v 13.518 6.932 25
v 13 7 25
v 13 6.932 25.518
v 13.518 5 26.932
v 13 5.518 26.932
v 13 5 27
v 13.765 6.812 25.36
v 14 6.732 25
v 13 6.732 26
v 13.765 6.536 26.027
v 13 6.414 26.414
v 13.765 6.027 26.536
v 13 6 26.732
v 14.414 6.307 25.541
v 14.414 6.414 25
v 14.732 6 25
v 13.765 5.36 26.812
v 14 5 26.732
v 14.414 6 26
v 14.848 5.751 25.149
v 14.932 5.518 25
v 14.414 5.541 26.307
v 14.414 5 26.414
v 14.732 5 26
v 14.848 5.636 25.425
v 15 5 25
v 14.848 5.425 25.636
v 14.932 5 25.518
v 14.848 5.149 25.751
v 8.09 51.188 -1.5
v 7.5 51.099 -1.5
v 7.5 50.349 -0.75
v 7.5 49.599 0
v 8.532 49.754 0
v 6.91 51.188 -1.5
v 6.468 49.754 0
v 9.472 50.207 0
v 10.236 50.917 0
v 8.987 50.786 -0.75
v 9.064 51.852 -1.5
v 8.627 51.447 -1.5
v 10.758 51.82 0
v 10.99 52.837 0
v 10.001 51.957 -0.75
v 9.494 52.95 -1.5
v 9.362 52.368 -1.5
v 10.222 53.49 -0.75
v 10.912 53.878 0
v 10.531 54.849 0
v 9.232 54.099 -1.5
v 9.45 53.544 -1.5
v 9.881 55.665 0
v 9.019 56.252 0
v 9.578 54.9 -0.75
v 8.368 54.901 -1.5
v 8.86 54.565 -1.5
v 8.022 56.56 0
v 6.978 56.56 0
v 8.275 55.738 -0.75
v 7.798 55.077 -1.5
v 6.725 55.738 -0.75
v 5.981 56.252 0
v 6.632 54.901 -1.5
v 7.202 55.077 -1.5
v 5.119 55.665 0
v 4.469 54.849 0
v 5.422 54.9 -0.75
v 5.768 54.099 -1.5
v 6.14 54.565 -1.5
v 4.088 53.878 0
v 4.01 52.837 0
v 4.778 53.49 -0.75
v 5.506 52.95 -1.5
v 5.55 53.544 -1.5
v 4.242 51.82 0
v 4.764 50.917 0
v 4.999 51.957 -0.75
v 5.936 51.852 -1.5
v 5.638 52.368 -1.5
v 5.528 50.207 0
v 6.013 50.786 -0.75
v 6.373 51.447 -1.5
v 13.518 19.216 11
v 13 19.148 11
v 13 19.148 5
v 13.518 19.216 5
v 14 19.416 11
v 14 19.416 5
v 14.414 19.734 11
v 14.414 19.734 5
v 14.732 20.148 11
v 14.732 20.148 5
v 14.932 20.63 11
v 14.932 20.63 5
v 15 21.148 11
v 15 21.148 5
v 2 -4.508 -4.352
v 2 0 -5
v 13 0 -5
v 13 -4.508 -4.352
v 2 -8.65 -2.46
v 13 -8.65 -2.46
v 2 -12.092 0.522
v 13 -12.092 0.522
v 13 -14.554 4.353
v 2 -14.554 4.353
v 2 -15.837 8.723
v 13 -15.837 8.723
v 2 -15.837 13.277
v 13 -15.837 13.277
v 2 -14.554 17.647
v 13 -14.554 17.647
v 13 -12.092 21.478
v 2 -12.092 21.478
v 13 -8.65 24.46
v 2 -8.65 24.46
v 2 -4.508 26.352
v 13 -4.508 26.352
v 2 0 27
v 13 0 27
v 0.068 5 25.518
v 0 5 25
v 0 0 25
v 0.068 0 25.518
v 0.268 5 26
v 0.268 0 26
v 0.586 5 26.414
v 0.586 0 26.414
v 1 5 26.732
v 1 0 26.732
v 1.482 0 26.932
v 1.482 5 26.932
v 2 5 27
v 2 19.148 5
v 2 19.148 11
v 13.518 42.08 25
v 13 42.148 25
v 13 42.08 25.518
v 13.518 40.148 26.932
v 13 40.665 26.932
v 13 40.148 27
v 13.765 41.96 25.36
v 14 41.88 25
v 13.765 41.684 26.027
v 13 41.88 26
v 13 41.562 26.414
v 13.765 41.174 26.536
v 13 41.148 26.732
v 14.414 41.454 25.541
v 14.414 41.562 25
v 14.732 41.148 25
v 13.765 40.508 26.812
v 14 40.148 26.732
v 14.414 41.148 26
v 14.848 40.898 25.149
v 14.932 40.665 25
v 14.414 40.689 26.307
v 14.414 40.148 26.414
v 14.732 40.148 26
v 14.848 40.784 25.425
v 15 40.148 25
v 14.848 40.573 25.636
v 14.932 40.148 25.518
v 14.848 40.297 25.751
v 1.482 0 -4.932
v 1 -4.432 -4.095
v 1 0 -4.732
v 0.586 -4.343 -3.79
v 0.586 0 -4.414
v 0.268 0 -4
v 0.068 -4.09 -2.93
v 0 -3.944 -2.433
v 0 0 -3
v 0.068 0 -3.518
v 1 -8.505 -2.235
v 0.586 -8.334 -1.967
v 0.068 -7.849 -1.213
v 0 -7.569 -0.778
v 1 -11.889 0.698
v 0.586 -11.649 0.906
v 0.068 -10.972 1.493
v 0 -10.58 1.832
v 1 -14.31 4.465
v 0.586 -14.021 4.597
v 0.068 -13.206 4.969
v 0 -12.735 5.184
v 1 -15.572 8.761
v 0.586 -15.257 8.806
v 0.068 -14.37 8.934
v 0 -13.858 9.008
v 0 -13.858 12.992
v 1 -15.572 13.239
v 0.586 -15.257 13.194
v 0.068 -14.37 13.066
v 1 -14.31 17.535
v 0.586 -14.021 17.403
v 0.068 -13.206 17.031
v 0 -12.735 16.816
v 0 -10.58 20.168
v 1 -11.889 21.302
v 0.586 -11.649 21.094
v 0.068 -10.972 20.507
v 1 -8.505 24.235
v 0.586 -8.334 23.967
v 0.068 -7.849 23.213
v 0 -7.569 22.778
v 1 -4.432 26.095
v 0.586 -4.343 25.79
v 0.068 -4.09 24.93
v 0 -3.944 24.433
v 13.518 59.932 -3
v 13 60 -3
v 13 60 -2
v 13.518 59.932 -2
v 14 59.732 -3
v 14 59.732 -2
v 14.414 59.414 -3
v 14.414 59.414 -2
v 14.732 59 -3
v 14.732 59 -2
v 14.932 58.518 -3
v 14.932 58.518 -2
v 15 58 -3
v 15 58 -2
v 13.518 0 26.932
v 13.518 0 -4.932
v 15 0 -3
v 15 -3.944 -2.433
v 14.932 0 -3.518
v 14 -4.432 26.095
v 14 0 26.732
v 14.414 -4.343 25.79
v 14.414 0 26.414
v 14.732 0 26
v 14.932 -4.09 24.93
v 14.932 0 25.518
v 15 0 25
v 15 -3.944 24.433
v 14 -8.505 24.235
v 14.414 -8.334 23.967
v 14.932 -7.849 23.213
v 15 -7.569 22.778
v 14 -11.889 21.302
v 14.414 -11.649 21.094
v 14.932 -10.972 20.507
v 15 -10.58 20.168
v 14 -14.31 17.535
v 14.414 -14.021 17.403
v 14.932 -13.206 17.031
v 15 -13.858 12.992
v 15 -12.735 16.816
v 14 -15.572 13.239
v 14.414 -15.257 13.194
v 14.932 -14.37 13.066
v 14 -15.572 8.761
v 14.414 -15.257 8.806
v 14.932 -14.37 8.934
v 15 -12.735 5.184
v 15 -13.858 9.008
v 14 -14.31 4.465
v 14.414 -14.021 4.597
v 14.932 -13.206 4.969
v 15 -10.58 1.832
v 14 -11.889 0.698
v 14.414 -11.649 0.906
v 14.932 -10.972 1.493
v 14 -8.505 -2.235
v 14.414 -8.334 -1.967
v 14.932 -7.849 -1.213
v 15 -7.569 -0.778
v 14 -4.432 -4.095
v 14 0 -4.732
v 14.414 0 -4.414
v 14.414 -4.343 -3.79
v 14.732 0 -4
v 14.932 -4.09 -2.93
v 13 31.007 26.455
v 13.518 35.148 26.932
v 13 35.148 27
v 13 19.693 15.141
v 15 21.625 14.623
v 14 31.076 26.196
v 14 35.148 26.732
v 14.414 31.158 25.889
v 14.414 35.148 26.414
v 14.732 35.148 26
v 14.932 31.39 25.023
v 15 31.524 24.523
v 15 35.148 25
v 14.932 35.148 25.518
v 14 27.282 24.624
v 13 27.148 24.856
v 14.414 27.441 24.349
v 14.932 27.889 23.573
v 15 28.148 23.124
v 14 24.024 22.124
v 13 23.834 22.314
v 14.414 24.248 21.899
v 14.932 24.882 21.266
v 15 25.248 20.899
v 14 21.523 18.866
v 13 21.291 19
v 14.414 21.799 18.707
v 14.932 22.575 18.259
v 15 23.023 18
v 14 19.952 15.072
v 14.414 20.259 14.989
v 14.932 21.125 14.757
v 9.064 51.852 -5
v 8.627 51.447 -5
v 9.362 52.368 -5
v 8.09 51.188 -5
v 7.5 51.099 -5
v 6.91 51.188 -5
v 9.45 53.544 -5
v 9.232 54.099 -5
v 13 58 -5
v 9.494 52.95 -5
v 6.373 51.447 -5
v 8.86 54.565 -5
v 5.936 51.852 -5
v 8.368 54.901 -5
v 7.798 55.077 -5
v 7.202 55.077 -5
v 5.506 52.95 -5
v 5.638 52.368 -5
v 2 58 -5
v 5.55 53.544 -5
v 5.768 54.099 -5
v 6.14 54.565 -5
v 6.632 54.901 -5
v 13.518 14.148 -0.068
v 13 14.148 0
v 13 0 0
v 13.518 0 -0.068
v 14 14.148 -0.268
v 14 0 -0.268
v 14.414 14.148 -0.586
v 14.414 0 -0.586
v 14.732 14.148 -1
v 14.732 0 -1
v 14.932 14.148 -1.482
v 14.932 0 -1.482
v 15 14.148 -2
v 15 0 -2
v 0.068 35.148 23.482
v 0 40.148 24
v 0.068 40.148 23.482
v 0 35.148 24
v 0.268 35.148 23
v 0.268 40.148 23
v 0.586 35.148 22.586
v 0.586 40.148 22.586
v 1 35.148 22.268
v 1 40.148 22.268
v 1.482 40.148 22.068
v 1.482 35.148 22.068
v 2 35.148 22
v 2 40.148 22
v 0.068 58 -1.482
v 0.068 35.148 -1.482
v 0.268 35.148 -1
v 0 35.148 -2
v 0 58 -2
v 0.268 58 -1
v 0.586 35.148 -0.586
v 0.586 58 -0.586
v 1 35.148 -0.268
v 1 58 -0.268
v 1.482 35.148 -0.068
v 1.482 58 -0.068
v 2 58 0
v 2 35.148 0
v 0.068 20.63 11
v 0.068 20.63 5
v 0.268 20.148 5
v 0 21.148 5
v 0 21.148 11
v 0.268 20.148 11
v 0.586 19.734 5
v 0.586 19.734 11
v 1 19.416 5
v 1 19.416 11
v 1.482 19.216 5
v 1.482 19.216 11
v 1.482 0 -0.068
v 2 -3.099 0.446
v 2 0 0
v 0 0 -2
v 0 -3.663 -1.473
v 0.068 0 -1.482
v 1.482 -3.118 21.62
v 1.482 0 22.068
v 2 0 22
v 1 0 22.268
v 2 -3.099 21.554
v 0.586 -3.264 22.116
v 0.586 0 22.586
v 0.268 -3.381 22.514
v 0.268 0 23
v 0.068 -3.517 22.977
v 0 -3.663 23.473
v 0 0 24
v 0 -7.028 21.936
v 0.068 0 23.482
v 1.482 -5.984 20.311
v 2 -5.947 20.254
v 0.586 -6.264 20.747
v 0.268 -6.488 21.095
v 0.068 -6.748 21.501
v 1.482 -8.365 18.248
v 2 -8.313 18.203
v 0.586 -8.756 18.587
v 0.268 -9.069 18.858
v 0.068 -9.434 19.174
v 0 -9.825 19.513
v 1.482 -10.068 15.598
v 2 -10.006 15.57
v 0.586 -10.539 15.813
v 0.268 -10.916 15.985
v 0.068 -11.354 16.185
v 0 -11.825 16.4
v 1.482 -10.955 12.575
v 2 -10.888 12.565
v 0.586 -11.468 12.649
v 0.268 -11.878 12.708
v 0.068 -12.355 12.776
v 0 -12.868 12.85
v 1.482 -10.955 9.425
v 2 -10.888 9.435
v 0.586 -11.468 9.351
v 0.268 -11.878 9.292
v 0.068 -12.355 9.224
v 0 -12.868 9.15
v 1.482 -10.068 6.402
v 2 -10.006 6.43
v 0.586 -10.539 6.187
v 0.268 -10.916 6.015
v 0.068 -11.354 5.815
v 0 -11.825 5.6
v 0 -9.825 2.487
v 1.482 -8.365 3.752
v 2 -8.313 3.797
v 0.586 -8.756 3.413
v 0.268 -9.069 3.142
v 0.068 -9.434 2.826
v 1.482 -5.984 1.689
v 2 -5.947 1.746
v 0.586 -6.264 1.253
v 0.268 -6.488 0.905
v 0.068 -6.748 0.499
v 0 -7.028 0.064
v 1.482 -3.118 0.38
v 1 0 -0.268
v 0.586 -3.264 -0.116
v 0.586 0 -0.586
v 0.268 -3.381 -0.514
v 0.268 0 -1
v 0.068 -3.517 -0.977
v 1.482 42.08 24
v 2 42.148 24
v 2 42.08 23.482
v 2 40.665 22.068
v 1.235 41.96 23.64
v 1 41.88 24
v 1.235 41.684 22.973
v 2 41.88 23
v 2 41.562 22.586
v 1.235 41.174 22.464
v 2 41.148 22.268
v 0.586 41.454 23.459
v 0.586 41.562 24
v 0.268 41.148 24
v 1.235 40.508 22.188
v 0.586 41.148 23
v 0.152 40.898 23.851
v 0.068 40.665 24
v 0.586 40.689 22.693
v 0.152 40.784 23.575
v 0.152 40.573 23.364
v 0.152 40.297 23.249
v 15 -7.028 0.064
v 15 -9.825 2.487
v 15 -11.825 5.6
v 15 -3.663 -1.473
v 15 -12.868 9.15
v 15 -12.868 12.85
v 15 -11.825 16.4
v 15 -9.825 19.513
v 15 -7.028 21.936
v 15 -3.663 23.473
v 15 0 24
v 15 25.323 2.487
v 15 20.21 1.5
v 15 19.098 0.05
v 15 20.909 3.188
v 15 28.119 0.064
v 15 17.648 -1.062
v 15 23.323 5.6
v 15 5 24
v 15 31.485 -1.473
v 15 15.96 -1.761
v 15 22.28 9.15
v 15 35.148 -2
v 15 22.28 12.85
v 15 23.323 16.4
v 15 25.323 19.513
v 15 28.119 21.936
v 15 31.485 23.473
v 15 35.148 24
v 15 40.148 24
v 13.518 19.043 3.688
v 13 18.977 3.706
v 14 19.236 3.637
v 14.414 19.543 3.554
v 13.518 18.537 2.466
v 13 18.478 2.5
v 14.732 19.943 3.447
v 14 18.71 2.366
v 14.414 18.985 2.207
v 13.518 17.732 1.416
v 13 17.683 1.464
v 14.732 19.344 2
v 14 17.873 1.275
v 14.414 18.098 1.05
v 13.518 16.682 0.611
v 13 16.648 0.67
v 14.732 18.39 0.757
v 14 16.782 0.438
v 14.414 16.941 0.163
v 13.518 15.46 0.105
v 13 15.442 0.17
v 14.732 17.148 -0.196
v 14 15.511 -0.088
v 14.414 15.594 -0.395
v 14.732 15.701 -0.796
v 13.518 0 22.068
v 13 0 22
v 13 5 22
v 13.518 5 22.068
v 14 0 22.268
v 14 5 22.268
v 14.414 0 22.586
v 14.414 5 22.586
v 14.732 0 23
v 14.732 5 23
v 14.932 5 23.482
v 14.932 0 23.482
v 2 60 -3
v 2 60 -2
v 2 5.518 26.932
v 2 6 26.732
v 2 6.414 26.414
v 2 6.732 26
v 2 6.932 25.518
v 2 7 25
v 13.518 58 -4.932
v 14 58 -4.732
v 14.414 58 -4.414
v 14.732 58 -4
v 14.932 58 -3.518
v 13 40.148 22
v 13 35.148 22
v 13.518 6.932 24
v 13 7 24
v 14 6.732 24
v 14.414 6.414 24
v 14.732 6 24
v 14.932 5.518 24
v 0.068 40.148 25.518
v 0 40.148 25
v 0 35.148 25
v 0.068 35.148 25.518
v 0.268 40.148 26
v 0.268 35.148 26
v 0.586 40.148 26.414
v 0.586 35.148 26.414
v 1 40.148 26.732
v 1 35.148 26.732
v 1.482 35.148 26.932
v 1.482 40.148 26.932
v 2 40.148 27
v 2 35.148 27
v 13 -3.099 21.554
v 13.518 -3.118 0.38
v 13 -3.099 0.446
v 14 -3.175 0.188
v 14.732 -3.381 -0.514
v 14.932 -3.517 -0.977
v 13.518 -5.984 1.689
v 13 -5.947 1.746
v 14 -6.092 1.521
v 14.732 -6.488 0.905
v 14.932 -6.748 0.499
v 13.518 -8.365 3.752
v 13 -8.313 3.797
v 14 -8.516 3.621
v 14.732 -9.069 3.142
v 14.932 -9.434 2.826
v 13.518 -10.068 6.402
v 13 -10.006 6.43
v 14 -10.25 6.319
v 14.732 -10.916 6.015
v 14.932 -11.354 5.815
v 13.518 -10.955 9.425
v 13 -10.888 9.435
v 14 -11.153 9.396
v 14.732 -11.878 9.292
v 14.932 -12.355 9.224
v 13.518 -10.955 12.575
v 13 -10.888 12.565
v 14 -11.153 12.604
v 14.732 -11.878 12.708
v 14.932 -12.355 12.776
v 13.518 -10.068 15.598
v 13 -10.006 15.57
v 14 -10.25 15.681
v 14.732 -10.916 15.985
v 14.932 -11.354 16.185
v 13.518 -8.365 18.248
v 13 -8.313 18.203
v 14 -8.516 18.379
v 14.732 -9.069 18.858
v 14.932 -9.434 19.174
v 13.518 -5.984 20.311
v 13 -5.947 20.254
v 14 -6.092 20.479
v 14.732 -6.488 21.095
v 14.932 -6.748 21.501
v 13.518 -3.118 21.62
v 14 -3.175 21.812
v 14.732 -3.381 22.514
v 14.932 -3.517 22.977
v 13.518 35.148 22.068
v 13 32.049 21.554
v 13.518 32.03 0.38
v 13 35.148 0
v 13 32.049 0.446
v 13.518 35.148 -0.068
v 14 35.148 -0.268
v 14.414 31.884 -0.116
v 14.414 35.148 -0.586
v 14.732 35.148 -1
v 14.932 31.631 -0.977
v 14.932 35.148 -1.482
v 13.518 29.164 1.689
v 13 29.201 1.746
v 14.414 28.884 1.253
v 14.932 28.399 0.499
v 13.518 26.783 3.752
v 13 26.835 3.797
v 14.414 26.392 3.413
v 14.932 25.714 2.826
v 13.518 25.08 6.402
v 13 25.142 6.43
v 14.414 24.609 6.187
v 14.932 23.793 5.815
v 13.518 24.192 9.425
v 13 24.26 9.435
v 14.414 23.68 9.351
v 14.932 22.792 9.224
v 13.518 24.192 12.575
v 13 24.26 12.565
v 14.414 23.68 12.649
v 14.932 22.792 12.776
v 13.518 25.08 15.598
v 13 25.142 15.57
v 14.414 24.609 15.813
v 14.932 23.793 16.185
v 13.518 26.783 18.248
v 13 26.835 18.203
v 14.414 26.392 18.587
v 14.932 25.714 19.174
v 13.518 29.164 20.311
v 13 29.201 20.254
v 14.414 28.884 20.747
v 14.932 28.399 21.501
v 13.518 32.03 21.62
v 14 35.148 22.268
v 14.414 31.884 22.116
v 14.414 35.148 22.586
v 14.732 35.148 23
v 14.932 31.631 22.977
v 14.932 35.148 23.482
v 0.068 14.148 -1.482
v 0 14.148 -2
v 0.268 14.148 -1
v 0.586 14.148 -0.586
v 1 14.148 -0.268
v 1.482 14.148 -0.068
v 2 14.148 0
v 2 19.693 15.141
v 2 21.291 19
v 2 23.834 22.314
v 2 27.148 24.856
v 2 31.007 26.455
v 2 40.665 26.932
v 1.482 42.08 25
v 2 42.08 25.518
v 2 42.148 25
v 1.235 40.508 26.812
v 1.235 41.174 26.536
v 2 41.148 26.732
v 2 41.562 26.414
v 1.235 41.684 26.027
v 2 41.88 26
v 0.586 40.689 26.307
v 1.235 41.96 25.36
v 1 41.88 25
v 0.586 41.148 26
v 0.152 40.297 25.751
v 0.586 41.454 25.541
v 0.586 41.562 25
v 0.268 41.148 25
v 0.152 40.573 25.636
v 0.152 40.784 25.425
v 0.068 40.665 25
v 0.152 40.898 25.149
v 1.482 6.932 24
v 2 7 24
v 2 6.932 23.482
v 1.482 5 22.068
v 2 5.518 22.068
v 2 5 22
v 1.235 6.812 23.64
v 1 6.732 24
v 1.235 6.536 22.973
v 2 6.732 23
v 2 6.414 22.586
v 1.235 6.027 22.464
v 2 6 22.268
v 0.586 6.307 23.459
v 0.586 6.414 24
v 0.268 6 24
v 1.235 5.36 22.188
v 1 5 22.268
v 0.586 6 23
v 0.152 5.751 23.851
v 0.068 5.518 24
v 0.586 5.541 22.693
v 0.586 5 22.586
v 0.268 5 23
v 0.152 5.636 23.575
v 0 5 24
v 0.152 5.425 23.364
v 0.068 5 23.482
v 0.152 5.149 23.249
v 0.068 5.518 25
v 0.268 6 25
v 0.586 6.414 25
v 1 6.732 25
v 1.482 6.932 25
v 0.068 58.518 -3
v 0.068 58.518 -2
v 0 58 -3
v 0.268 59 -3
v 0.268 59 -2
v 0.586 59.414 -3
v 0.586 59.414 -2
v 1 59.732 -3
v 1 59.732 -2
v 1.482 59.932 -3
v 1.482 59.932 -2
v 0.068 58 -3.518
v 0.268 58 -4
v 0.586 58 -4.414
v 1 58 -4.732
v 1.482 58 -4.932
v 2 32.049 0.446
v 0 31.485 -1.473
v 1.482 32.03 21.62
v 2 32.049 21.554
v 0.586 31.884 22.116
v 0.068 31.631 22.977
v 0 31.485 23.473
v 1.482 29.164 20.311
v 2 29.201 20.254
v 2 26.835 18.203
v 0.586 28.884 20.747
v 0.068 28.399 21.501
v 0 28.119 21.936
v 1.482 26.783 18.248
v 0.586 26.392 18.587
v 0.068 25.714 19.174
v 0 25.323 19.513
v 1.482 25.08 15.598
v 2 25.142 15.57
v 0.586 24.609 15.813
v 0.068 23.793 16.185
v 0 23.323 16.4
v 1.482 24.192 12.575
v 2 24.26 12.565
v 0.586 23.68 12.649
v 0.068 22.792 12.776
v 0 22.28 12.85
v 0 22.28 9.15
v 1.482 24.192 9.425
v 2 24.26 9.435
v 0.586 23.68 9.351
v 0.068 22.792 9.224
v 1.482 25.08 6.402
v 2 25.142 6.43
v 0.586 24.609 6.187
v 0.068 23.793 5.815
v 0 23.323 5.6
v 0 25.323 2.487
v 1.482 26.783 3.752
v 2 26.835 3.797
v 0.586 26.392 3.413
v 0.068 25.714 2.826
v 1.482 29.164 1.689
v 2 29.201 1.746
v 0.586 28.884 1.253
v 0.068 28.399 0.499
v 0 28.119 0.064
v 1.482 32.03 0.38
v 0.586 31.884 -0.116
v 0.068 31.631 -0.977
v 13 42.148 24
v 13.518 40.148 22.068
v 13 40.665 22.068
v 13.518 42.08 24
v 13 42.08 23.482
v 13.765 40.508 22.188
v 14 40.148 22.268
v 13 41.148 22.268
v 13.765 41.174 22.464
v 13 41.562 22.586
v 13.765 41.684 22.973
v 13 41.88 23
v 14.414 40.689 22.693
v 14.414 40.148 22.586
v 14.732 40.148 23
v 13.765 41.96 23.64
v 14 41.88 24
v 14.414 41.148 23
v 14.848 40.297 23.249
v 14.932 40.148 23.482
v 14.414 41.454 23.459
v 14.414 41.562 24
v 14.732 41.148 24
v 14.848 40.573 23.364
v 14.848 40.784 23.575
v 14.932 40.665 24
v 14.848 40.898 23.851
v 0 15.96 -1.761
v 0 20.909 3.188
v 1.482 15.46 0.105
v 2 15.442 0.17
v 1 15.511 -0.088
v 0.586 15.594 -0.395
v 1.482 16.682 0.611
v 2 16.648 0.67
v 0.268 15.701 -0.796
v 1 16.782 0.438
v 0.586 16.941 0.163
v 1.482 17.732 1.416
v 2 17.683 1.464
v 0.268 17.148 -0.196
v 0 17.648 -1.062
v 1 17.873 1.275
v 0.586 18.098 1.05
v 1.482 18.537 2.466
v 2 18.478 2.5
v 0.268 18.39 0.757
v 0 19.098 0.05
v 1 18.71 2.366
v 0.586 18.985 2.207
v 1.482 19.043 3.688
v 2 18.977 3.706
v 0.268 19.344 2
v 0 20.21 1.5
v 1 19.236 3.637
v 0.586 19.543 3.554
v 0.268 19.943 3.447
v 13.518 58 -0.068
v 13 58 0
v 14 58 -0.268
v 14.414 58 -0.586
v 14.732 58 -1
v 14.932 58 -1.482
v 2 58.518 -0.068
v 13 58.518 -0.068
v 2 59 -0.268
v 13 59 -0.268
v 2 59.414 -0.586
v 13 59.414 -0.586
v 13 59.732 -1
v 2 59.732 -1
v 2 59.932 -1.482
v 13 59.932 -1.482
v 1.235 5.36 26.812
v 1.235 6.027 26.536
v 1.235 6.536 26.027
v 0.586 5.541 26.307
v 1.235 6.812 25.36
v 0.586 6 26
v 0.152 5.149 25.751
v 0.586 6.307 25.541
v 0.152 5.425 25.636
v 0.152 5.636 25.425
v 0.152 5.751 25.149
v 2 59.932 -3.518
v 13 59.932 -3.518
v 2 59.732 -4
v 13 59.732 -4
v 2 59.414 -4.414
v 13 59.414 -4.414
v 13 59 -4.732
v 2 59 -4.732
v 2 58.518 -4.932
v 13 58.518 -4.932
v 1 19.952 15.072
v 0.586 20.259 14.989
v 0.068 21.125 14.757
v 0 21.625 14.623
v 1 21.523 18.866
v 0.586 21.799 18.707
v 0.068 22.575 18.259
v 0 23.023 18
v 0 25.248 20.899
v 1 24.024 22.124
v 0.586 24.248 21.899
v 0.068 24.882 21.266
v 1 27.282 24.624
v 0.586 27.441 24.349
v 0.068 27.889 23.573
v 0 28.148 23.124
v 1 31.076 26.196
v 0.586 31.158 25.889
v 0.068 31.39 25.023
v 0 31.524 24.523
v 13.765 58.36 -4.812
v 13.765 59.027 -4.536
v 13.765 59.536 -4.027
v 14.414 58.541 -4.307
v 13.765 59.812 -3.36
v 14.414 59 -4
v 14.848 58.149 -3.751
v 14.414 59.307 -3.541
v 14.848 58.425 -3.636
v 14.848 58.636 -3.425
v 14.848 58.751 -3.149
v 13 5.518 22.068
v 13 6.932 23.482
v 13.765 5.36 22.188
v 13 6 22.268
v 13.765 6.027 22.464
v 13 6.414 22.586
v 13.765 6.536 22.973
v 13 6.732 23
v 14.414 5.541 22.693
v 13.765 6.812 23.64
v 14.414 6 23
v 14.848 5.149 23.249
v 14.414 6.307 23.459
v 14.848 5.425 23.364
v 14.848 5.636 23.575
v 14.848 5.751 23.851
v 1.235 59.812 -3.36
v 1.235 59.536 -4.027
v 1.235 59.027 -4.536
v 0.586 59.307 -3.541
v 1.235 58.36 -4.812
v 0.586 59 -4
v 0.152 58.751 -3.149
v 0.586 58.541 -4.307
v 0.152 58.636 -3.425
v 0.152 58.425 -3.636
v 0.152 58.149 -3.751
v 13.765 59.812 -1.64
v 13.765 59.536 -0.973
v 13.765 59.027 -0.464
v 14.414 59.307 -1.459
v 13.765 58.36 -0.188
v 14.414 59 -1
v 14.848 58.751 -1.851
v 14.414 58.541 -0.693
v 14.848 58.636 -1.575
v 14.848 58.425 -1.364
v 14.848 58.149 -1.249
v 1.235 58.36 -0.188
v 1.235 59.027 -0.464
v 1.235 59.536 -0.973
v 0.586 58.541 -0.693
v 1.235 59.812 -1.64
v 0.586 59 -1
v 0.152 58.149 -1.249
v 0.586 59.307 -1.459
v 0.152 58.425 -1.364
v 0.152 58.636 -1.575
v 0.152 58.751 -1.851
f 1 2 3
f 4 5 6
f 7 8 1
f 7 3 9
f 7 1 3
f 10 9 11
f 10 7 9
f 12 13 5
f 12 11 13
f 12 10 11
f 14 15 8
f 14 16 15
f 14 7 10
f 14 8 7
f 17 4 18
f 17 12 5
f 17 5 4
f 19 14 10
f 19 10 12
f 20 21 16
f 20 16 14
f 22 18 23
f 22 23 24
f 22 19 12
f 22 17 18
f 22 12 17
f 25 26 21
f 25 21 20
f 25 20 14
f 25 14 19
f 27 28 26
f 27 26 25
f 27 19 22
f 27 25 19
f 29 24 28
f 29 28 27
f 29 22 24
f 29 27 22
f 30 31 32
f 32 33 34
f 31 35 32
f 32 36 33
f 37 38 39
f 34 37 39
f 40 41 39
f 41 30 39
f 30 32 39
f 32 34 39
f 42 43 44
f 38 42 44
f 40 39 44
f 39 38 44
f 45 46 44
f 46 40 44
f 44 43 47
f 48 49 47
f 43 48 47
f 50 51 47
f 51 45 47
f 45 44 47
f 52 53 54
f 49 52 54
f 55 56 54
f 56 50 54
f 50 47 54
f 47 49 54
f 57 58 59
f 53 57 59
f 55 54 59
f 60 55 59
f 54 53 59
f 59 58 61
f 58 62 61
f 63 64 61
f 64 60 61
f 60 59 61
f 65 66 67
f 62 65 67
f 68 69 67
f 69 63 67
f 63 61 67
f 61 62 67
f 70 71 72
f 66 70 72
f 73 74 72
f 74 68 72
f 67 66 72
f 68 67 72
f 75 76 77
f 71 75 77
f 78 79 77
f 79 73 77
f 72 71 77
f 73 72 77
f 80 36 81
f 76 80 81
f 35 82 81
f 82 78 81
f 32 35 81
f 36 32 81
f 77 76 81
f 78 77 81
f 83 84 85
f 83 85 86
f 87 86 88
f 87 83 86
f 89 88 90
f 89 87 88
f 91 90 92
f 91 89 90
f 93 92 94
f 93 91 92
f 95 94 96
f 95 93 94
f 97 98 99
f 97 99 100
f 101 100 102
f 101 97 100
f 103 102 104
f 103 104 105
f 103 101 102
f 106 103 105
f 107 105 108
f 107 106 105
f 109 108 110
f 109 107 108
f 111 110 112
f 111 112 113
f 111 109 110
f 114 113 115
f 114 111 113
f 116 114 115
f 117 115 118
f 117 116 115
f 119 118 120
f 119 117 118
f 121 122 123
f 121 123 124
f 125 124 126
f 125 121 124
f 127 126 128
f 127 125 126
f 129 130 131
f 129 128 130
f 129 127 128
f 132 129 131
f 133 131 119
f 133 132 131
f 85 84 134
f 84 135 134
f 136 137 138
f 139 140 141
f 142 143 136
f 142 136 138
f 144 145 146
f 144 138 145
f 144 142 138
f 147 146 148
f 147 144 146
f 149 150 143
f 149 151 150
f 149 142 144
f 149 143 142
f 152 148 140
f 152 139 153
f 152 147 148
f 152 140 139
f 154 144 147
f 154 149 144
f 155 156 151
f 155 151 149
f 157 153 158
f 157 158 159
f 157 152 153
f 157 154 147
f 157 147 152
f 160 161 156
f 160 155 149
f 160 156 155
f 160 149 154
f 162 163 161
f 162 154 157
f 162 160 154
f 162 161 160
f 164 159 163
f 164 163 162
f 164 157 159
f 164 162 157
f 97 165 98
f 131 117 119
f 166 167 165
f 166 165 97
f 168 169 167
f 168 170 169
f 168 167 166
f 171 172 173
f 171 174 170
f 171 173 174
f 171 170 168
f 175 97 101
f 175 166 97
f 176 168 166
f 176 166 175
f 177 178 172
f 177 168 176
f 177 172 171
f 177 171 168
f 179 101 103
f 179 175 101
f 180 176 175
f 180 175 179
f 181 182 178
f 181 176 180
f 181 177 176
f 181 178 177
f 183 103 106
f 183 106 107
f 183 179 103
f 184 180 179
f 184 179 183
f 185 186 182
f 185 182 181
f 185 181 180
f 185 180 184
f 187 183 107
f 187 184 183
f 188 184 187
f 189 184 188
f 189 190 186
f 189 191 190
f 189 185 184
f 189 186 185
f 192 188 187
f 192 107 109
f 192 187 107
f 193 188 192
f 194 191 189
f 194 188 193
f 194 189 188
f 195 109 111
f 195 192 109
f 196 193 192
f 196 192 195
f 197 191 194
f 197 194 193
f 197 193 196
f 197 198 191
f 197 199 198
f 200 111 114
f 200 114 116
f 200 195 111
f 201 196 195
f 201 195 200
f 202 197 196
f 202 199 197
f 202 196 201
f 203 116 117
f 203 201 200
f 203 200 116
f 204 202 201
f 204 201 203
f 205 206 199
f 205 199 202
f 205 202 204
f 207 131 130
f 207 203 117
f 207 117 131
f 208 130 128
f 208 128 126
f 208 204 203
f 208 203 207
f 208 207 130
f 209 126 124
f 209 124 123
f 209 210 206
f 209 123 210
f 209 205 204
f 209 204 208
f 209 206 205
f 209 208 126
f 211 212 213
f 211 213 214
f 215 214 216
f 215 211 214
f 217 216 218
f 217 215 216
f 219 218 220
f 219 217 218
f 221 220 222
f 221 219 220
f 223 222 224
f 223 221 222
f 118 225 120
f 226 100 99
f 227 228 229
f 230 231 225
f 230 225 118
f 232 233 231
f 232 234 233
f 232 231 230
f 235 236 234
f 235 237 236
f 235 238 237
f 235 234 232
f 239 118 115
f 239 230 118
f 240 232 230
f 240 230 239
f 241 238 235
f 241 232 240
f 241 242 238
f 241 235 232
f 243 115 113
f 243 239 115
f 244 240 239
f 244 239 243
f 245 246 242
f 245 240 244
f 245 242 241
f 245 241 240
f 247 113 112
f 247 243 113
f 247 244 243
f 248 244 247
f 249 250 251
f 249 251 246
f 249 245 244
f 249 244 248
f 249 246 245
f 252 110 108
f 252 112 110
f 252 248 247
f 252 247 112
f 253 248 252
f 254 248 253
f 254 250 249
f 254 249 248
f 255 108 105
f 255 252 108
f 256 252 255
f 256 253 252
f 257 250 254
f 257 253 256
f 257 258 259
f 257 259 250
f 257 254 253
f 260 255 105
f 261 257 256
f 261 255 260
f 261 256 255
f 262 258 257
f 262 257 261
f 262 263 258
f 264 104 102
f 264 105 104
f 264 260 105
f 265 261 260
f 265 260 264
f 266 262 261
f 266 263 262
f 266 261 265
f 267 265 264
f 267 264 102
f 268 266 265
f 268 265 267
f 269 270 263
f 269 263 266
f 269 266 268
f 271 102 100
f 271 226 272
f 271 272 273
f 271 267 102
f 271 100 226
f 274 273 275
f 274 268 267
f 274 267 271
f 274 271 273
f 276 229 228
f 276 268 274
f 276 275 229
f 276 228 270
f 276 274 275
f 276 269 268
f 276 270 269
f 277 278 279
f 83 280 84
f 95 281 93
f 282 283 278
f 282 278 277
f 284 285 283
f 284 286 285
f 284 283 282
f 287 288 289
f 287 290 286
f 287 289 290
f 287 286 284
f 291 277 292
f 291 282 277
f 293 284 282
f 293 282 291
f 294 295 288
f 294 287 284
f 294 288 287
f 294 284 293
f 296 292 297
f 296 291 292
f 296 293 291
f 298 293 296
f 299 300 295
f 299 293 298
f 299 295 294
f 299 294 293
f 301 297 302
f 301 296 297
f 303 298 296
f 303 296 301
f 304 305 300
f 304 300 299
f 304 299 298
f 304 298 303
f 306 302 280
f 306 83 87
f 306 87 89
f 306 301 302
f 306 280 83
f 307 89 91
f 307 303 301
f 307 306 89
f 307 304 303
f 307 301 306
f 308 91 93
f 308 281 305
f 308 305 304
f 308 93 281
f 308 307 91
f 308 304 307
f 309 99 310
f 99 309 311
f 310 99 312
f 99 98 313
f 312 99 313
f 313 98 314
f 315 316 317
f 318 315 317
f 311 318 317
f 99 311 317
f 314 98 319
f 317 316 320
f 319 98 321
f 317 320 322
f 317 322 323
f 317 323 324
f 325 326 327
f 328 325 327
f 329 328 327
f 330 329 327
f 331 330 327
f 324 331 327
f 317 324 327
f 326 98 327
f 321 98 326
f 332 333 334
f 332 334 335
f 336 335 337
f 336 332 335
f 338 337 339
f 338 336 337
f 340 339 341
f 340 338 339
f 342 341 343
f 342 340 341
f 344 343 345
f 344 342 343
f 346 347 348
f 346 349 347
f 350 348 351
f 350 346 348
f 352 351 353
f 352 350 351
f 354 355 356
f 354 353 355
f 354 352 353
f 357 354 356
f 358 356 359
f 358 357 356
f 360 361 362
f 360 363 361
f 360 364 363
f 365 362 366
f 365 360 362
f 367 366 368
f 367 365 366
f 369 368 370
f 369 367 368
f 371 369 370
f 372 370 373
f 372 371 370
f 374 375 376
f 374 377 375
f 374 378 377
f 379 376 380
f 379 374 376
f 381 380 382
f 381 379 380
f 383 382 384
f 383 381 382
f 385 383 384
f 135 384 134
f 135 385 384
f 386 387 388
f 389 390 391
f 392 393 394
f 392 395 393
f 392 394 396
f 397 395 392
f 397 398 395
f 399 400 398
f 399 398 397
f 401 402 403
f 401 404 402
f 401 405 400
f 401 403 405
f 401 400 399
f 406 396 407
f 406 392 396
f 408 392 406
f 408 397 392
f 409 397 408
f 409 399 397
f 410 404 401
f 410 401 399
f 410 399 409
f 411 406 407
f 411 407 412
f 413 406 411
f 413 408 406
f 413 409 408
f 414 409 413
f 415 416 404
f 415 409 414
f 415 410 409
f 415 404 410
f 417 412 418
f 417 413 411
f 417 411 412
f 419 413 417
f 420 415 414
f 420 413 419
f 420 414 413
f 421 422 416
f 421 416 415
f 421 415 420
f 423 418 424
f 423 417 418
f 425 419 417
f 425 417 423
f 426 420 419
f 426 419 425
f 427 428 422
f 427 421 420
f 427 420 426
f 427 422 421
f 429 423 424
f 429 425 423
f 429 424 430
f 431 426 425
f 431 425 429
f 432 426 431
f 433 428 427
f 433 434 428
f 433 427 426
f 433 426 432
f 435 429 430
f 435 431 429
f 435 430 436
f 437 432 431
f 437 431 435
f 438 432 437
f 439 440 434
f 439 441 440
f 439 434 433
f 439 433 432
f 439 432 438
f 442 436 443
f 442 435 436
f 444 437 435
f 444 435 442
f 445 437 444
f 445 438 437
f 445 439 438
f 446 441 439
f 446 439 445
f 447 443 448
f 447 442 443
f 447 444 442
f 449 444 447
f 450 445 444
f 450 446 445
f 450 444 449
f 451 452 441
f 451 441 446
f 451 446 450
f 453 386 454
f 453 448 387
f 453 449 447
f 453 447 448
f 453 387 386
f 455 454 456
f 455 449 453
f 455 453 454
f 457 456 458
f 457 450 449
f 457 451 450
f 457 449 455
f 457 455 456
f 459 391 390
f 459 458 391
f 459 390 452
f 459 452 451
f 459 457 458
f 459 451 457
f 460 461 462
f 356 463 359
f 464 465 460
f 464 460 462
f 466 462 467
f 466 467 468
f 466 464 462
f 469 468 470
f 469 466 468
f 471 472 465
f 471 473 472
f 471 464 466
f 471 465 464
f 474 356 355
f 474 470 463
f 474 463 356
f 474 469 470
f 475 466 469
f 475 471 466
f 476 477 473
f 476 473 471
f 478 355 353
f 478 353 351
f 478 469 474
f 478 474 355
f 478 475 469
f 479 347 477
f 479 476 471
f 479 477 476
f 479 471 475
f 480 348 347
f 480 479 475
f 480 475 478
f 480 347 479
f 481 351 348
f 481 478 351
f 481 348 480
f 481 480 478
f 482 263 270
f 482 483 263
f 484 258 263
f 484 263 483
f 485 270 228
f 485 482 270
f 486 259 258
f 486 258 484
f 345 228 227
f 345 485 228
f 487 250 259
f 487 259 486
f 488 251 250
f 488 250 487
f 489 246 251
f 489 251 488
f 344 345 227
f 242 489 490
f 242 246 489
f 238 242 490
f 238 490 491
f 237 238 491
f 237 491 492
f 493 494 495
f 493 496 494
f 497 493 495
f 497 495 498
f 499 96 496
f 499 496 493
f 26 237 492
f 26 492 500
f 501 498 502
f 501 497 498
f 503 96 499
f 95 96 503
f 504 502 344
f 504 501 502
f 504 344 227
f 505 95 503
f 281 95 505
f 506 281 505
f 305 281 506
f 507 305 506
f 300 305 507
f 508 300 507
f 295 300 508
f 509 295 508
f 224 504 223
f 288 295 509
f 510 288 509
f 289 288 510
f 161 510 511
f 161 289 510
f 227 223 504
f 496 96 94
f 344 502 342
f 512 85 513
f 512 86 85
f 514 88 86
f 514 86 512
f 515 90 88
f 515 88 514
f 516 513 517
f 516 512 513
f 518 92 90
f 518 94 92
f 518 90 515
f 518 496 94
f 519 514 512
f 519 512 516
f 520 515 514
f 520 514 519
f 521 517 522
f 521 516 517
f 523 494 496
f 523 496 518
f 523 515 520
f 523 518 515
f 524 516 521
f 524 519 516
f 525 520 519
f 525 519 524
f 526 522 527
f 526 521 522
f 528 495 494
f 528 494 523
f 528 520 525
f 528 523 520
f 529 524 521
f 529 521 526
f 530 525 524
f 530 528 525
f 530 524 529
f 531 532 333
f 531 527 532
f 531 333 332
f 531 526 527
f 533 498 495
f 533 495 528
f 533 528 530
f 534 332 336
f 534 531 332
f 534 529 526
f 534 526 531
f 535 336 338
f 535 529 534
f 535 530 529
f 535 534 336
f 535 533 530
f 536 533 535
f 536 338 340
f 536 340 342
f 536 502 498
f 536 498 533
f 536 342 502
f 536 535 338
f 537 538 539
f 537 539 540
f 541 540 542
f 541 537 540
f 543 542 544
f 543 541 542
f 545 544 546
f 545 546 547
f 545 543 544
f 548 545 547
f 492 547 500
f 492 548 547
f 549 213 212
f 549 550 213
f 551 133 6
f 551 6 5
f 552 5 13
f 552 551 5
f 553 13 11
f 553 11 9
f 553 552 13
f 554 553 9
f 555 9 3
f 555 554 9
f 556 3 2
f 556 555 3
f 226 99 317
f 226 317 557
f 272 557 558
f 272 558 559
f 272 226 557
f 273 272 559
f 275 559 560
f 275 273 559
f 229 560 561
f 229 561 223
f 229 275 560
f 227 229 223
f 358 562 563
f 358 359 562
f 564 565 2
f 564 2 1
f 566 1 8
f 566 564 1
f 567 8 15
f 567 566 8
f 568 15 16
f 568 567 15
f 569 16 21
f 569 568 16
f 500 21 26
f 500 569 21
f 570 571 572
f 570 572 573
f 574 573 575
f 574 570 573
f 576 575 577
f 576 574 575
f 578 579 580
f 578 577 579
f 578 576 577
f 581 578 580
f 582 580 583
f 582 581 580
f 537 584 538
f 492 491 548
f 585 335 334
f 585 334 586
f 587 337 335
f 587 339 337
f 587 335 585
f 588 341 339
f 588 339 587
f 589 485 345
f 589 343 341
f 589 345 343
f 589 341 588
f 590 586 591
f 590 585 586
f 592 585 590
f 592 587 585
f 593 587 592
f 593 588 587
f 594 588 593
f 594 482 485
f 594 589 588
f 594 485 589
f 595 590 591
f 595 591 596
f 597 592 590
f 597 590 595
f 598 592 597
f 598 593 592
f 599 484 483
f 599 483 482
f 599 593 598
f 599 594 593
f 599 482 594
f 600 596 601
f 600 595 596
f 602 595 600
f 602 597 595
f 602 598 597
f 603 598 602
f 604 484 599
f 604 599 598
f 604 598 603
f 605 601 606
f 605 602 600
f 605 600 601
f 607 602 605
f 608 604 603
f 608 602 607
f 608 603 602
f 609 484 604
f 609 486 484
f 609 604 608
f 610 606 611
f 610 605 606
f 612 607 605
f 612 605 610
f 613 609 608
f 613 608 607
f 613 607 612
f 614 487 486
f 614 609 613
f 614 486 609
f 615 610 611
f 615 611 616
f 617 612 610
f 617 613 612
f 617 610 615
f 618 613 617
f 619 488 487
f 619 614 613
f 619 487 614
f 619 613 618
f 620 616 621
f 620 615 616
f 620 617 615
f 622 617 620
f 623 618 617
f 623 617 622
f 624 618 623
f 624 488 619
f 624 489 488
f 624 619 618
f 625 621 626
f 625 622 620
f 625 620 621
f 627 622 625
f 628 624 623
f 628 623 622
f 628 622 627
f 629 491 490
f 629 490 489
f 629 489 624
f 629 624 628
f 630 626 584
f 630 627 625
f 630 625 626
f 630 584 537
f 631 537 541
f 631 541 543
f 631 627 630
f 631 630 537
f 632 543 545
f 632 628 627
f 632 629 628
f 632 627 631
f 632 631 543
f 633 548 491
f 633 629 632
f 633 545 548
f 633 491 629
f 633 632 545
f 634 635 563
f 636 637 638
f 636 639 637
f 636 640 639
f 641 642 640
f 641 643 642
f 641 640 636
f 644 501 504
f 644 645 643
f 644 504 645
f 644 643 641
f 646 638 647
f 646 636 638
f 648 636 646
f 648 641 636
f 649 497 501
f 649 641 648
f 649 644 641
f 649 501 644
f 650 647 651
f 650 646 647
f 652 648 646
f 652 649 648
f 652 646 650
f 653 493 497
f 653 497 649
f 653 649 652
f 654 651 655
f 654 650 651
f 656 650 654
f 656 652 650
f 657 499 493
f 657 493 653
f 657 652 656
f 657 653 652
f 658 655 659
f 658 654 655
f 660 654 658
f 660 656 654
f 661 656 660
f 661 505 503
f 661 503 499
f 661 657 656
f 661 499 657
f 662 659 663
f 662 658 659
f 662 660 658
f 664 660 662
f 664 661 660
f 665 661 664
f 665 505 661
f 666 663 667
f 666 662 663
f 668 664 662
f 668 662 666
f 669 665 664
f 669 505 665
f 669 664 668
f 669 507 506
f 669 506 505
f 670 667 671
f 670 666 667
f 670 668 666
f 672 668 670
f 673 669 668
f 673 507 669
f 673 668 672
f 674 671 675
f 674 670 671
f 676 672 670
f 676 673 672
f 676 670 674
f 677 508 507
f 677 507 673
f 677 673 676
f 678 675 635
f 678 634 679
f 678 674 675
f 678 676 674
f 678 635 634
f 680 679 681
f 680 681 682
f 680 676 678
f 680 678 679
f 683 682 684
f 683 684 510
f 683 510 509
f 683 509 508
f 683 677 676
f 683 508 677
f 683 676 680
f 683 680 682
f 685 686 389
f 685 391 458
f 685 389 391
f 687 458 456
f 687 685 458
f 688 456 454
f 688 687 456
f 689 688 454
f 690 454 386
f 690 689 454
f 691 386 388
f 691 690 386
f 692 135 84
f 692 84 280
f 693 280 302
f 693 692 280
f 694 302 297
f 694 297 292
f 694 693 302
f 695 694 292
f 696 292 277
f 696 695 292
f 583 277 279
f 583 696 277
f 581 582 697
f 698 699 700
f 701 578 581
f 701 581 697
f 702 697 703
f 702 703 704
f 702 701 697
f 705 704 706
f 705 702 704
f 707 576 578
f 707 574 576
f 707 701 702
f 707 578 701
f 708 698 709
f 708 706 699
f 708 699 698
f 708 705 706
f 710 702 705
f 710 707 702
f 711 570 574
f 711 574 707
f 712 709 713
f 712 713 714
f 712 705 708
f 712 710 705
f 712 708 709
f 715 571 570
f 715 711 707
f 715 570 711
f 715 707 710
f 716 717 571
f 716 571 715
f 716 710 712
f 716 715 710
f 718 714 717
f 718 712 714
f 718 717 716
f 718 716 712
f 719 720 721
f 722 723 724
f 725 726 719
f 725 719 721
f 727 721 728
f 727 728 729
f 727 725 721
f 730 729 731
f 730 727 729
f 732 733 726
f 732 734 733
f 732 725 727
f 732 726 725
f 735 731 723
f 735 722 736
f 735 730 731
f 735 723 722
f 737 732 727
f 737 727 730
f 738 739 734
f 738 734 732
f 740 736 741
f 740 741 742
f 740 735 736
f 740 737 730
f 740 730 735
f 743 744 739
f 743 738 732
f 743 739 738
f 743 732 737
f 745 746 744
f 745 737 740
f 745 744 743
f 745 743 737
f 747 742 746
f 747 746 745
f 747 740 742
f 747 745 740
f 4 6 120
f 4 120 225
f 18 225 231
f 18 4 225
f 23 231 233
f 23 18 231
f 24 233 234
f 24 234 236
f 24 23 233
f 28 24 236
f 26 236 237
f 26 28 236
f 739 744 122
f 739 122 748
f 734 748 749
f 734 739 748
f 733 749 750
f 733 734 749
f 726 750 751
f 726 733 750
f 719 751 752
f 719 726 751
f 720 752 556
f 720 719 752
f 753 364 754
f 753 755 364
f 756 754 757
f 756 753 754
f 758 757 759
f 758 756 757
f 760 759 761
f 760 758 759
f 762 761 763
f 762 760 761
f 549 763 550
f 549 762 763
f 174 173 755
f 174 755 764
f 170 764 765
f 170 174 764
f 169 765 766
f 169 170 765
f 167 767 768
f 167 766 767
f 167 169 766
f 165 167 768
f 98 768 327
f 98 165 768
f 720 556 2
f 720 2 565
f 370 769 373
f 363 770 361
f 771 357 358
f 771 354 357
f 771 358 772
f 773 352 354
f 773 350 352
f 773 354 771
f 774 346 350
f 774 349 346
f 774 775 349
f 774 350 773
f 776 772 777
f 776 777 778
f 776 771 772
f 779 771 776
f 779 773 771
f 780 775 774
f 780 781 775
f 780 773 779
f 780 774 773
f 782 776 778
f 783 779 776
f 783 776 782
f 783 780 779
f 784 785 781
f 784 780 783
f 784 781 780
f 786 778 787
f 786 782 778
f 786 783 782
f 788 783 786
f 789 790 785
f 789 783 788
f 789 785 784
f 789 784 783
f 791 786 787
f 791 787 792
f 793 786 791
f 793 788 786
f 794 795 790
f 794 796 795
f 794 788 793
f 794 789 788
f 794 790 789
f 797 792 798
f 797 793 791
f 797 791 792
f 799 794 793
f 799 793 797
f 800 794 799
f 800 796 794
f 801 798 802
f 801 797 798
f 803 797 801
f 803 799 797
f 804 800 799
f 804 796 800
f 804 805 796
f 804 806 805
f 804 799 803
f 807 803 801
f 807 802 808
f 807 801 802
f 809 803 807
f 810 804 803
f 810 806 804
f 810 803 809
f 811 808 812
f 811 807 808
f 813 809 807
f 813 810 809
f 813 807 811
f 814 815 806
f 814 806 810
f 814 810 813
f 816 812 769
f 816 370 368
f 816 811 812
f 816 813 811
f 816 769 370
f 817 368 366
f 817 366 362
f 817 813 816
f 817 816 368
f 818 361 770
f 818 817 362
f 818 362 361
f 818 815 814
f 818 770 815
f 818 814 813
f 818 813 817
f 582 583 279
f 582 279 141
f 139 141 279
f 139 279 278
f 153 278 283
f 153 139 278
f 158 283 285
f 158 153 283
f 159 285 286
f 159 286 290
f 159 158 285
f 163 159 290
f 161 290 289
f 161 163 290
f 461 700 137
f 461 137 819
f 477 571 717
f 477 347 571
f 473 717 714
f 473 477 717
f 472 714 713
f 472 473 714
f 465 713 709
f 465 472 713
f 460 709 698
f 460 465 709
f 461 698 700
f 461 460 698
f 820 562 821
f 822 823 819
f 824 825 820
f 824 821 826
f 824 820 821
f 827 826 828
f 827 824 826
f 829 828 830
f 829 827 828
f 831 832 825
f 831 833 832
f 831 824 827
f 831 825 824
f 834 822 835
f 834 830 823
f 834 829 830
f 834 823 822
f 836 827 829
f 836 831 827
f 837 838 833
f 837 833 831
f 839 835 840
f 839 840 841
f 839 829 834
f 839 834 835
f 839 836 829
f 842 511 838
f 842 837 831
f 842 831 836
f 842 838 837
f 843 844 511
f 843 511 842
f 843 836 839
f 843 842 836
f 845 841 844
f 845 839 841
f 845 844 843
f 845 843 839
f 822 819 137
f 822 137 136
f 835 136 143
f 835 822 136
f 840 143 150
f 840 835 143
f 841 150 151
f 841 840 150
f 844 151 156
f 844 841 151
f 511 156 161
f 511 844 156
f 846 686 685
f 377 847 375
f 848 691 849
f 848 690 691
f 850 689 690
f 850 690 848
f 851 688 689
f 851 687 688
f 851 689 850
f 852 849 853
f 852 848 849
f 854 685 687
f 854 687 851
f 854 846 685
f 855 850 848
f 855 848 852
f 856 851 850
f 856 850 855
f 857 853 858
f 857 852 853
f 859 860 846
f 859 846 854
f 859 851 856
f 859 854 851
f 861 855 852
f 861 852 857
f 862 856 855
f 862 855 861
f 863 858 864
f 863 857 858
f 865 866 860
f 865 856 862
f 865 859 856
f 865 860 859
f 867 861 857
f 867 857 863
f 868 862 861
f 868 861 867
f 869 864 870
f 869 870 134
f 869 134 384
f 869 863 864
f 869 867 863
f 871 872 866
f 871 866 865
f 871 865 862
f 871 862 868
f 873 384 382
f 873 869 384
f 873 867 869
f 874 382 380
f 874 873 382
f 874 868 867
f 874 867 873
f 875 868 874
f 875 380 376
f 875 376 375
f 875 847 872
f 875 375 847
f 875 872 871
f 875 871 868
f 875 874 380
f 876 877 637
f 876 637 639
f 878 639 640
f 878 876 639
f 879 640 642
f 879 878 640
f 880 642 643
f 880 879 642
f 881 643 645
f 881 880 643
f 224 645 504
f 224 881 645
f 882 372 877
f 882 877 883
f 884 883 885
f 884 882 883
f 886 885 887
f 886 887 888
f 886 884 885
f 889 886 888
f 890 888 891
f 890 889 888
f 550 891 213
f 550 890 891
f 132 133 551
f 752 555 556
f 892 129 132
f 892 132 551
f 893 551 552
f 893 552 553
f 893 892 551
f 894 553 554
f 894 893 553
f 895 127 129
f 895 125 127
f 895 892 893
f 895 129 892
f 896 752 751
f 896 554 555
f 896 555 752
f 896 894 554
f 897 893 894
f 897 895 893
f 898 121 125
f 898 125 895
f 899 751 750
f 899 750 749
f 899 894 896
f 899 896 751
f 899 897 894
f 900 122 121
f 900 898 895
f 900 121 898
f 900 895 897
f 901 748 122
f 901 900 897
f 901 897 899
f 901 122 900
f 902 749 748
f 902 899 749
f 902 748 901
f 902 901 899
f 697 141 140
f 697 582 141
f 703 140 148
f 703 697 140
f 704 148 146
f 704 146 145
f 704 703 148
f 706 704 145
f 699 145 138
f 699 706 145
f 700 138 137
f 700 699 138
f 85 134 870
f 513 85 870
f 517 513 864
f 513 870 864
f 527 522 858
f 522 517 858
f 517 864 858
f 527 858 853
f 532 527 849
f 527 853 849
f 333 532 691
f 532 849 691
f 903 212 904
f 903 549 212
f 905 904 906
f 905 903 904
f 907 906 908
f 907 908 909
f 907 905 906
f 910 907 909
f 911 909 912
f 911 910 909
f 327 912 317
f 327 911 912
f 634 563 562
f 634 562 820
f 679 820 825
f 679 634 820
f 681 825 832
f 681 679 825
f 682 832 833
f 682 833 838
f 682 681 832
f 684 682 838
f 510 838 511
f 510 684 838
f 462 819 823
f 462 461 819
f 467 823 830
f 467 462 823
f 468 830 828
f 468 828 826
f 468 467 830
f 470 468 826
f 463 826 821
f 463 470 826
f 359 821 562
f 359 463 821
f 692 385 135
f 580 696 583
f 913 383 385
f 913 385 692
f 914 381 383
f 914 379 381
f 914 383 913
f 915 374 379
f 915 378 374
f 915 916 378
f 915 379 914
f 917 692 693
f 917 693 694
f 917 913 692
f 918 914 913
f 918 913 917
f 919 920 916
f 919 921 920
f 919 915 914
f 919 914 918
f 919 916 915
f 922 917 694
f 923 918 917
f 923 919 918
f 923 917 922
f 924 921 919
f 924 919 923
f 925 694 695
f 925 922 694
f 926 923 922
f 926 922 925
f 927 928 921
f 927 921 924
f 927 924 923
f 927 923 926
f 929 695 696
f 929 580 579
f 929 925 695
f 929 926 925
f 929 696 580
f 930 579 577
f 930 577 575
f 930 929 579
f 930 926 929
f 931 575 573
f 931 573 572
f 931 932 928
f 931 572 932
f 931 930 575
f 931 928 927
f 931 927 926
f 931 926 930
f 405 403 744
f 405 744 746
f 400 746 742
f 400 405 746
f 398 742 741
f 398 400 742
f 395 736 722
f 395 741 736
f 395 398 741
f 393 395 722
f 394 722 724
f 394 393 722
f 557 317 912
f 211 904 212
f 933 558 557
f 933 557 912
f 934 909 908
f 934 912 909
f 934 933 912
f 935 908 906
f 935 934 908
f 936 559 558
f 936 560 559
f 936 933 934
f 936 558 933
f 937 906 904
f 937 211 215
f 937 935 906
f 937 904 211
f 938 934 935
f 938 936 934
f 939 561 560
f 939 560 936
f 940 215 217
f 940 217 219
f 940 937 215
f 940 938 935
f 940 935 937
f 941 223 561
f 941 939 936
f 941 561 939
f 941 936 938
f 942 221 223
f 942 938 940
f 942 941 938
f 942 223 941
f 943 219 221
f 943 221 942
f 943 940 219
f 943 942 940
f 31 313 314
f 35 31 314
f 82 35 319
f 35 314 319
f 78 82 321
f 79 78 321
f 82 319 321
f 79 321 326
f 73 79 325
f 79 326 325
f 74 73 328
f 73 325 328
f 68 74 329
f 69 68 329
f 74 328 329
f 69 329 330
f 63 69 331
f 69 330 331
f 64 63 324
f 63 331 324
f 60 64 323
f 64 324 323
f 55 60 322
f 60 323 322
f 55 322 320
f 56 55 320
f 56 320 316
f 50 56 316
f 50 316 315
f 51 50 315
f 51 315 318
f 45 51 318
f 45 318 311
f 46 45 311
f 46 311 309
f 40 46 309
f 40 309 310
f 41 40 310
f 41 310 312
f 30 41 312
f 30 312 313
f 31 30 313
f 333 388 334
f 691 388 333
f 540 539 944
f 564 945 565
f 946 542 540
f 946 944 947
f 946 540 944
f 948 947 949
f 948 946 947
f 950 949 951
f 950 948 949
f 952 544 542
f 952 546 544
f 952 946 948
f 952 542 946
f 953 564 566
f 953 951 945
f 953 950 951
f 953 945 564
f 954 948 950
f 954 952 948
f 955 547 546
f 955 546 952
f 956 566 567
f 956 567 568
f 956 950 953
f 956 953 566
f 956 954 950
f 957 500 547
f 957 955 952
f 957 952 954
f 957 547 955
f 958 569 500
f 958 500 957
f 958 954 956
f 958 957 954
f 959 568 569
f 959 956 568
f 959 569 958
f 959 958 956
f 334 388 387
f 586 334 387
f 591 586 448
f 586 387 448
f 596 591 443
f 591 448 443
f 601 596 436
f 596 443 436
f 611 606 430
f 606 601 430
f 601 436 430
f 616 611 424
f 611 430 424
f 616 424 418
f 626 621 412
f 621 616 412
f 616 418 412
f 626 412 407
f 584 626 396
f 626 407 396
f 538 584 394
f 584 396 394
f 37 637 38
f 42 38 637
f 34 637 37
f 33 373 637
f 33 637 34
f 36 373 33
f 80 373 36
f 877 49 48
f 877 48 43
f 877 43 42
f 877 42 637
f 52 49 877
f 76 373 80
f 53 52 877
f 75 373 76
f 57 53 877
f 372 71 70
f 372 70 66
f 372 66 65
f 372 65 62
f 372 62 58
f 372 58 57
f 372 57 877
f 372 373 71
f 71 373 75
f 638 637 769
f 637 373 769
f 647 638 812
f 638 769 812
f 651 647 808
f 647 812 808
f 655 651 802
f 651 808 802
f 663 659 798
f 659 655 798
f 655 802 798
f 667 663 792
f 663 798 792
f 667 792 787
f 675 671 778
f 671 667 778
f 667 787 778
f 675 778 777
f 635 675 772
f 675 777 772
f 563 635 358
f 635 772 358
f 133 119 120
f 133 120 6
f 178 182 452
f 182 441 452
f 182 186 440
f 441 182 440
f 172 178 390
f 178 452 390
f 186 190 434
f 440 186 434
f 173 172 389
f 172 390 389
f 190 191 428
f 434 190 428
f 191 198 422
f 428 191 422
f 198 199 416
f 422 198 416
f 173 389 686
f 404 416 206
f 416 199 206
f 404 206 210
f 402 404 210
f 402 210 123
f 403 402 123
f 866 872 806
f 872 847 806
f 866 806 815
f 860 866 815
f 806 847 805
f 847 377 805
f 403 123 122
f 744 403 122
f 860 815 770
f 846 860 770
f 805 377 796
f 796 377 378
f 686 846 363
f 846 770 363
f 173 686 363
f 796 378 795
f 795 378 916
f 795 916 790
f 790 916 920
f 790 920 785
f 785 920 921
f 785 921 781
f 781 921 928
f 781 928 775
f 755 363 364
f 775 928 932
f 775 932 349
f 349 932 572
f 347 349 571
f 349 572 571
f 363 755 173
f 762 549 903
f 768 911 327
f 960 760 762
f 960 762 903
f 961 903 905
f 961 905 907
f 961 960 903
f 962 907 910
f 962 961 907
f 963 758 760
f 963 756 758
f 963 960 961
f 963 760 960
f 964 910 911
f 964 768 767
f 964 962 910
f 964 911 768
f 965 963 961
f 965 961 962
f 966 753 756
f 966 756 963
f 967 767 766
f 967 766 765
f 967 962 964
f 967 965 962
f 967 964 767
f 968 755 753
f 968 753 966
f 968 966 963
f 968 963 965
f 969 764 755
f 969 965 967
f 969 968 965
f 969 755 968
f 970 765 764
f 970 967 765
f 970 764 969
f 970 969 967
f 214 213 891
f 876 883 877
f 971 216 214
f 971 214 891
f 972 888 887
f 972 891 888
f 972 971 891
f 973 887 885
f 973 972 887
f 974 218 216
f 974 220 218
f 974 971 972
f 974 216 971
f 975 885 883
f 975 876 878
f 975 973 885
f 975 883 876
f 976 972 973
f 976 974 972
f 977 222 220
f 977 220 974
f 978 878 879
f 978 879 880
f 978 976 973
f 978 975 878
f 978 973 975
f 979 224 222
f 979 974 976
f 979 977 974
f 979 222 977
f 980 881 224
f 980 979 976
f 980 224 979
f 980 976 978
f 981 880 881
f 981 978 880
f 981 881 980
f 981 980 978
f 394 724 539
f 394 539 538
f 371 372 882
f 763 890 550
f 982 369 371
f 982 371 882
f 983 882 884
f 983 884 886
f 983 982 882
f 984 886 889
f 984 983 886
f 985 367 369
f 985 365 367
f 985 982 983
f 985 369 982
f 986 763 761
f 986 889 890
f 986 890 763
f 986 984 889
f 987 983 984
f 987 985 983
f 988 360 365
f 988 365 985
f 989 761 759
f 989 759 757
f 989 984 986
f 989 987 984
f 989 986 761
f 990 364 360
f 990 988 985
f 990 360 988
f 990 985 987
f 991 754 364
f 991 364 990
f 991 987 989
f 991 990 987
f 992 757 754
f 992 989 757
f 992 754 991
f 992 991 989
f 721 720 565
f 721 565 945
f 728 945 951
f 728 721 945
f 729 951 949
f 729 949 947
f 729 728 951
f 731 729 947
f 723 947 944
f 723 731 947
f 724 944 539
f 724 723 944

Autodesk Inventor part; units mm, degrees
ref_plane "YZ Plane" through (0, 0, 0) normal (1, 0, 0) x (0, 1, 0)
ref_plane "XZ Plane" through (0, 0, 0) normal (0, 1, 0) x (-1, 0, 0)
ref_plane "XY Plane" through (0, 0, 0) normal (0, 0, 1) x (1, 0, 0)
sketch "Sketch1" plane through (0, 0, 0) normal (1, 0, 0) x (0, 1, 0)
  arc A0 (0, 22) -> (0, 0) centre (0, 11) ccw
  line L0 (-11, 11) -> (24, 11) construction
  arc A1 (35.1478, 22) -> (35.1478, 0) centre (35.1478, 11) ccw
  arc A2 (0, 27) -> (0, -5) centre (0, 11) ccw
  line L1 (0, -5) -> (58, -5)
  arc A3 (35.1478, 5022) -> (35.1478, -5000) centre (35.1478, 11) ccw
  arc A4 (35.1478, 27) -> (19.1478, 11) centre (35.1478, 11) ccw
  line L2 (0, 0) -> (14.1478, 0)
  line L3 (35.1478, 0) -> (58, 0)
  line L4 (35.1478, 27) -> (40.1478, 27)
  line L5 (42.1478, 25) -> (42.1478, 24)
  line L6 (40.1478, 22) -> (35.1478, 22)
  line L7 (0, 27) -> (5, 27)
  line L8 (7, 25) -> (7, 24)
  line L9 (5, 22) -> (0, 22)
  line L10 (60, -2) -> (60, -3)
  arc A5 (40.1478, 22) -> (42.1478, 24) centre (40.1478, 24) ccw
  arc A6 (42.1478, 25) -> (40.1478, 27) centre (40.1478, 25) ccw
  arc A7 (60, -2) -> (58, 0) centre (58, -2) ccw
  arc A8 (58, -5) -> (60, -3) centre (58, -3) ccw
  arc A9 (5, 22) -> (7, 24) centre (5, 24) ccw
  arc A10 (7, 25) -> (5, 27) centre (5, 25) ccw
  line L11 (19.1478, 11) -> (19.1478, 5)
  arc A11 (14.1478, 0) -> (19.1478, 5) centre (14.1478, 5) ccw
  point P0 (60, 0)
  point P1 (42.1478, 27)
  point P2 (42.1478, 22)
  point P3 (7, 27)
  dimension "d0" = 60
  dimension "d1" = 22
  dimension "d2" = 35
  dimension "d3" = 22
  dimension "d5" = 5
  dimension "d6" = 5000
  dimension "d7" = 5
  dimension "d8" = 7
  dimension "d9" = 5
  dimension "d10" = 7
  dimension "d11" = 2
  dimension "d12" = 5
extrude "Extrusion1" add sketch "Sketch1" along normal blind 15
fillet "Fillet1" radius 2 44 edges at (0, 37.6478, 22) (0, 41.562, 22.5858) (0, 42.1478, 24.5) (0, 41.562, 26.4142) (0, 37.6478, 27) (0, 23.8341, 22.3137) (0, 19.1478, 8) (0, 17.6833, 1.4645) (0, 7.0739, 0) (0, -11, 11) (0, 2.5, 22) (0, 6.4142, 22.5858) (0, 7, 24.5) (0, 6.4142, 26.4142) (0, 2.5, 27) (0, -16, 11) (0, 29, -5) (0, 59.4142, -4.4142) (0, 60, -2.5) (0, 59.4142, -0.5858) (0, 46.5739, 0) (0, 24.1478, 11) (15, 37.6478, 22) (15, 41.562, 22.5858) (15, 42.1478, 24.5) (15, 41.562, 26.4142) (15, 37.6478, 27) (15, 23.8341, 22.3137) (15, 19.1478, 8) (15, 17.6833, 1.4645) (15, 7.0739, 0) (15, -11, 11) (15, 2.5, 22) (15, 6.4142, 22.5858) (15, 7, 24.5) (15, 6.4142, 26.4142) (15, 2.5, 27) (15, -16, 11) (15, 29, -5) (15, 59.4142, -4.4142) (15, 60, -2.5) (15, 59.4142, -0.5858) (15, 46.5739, 0) (15, 24.1478, 11)
sketch "Sketch2" plane through (2, 58, 0) normal (0, 0, 1) x (1, 0, 0)
  line L0 (11, 0) -> (11, -22.8522) construction
  line L1 (0, 0) -> (11, 0) construction
  line L2 (0, -22.8522) -> (0, 0) construction
  line L3 (0, -22.8522) -> (11, -22.8522) construction
  line L4 (0, 0) -> (11, 0) construction
  line L5 (5.5, 0) -> (5.5, -9.8019) construction
  point P0 (-2, -58)
  point P1 (5.5, -4.901)
hole "Hole1" at (7.5, 53.099, 0) direction (0, 0, -1) diameter 4 end through all countersink diameter 7 countersink angle 90
properties part number "double_rounded"
